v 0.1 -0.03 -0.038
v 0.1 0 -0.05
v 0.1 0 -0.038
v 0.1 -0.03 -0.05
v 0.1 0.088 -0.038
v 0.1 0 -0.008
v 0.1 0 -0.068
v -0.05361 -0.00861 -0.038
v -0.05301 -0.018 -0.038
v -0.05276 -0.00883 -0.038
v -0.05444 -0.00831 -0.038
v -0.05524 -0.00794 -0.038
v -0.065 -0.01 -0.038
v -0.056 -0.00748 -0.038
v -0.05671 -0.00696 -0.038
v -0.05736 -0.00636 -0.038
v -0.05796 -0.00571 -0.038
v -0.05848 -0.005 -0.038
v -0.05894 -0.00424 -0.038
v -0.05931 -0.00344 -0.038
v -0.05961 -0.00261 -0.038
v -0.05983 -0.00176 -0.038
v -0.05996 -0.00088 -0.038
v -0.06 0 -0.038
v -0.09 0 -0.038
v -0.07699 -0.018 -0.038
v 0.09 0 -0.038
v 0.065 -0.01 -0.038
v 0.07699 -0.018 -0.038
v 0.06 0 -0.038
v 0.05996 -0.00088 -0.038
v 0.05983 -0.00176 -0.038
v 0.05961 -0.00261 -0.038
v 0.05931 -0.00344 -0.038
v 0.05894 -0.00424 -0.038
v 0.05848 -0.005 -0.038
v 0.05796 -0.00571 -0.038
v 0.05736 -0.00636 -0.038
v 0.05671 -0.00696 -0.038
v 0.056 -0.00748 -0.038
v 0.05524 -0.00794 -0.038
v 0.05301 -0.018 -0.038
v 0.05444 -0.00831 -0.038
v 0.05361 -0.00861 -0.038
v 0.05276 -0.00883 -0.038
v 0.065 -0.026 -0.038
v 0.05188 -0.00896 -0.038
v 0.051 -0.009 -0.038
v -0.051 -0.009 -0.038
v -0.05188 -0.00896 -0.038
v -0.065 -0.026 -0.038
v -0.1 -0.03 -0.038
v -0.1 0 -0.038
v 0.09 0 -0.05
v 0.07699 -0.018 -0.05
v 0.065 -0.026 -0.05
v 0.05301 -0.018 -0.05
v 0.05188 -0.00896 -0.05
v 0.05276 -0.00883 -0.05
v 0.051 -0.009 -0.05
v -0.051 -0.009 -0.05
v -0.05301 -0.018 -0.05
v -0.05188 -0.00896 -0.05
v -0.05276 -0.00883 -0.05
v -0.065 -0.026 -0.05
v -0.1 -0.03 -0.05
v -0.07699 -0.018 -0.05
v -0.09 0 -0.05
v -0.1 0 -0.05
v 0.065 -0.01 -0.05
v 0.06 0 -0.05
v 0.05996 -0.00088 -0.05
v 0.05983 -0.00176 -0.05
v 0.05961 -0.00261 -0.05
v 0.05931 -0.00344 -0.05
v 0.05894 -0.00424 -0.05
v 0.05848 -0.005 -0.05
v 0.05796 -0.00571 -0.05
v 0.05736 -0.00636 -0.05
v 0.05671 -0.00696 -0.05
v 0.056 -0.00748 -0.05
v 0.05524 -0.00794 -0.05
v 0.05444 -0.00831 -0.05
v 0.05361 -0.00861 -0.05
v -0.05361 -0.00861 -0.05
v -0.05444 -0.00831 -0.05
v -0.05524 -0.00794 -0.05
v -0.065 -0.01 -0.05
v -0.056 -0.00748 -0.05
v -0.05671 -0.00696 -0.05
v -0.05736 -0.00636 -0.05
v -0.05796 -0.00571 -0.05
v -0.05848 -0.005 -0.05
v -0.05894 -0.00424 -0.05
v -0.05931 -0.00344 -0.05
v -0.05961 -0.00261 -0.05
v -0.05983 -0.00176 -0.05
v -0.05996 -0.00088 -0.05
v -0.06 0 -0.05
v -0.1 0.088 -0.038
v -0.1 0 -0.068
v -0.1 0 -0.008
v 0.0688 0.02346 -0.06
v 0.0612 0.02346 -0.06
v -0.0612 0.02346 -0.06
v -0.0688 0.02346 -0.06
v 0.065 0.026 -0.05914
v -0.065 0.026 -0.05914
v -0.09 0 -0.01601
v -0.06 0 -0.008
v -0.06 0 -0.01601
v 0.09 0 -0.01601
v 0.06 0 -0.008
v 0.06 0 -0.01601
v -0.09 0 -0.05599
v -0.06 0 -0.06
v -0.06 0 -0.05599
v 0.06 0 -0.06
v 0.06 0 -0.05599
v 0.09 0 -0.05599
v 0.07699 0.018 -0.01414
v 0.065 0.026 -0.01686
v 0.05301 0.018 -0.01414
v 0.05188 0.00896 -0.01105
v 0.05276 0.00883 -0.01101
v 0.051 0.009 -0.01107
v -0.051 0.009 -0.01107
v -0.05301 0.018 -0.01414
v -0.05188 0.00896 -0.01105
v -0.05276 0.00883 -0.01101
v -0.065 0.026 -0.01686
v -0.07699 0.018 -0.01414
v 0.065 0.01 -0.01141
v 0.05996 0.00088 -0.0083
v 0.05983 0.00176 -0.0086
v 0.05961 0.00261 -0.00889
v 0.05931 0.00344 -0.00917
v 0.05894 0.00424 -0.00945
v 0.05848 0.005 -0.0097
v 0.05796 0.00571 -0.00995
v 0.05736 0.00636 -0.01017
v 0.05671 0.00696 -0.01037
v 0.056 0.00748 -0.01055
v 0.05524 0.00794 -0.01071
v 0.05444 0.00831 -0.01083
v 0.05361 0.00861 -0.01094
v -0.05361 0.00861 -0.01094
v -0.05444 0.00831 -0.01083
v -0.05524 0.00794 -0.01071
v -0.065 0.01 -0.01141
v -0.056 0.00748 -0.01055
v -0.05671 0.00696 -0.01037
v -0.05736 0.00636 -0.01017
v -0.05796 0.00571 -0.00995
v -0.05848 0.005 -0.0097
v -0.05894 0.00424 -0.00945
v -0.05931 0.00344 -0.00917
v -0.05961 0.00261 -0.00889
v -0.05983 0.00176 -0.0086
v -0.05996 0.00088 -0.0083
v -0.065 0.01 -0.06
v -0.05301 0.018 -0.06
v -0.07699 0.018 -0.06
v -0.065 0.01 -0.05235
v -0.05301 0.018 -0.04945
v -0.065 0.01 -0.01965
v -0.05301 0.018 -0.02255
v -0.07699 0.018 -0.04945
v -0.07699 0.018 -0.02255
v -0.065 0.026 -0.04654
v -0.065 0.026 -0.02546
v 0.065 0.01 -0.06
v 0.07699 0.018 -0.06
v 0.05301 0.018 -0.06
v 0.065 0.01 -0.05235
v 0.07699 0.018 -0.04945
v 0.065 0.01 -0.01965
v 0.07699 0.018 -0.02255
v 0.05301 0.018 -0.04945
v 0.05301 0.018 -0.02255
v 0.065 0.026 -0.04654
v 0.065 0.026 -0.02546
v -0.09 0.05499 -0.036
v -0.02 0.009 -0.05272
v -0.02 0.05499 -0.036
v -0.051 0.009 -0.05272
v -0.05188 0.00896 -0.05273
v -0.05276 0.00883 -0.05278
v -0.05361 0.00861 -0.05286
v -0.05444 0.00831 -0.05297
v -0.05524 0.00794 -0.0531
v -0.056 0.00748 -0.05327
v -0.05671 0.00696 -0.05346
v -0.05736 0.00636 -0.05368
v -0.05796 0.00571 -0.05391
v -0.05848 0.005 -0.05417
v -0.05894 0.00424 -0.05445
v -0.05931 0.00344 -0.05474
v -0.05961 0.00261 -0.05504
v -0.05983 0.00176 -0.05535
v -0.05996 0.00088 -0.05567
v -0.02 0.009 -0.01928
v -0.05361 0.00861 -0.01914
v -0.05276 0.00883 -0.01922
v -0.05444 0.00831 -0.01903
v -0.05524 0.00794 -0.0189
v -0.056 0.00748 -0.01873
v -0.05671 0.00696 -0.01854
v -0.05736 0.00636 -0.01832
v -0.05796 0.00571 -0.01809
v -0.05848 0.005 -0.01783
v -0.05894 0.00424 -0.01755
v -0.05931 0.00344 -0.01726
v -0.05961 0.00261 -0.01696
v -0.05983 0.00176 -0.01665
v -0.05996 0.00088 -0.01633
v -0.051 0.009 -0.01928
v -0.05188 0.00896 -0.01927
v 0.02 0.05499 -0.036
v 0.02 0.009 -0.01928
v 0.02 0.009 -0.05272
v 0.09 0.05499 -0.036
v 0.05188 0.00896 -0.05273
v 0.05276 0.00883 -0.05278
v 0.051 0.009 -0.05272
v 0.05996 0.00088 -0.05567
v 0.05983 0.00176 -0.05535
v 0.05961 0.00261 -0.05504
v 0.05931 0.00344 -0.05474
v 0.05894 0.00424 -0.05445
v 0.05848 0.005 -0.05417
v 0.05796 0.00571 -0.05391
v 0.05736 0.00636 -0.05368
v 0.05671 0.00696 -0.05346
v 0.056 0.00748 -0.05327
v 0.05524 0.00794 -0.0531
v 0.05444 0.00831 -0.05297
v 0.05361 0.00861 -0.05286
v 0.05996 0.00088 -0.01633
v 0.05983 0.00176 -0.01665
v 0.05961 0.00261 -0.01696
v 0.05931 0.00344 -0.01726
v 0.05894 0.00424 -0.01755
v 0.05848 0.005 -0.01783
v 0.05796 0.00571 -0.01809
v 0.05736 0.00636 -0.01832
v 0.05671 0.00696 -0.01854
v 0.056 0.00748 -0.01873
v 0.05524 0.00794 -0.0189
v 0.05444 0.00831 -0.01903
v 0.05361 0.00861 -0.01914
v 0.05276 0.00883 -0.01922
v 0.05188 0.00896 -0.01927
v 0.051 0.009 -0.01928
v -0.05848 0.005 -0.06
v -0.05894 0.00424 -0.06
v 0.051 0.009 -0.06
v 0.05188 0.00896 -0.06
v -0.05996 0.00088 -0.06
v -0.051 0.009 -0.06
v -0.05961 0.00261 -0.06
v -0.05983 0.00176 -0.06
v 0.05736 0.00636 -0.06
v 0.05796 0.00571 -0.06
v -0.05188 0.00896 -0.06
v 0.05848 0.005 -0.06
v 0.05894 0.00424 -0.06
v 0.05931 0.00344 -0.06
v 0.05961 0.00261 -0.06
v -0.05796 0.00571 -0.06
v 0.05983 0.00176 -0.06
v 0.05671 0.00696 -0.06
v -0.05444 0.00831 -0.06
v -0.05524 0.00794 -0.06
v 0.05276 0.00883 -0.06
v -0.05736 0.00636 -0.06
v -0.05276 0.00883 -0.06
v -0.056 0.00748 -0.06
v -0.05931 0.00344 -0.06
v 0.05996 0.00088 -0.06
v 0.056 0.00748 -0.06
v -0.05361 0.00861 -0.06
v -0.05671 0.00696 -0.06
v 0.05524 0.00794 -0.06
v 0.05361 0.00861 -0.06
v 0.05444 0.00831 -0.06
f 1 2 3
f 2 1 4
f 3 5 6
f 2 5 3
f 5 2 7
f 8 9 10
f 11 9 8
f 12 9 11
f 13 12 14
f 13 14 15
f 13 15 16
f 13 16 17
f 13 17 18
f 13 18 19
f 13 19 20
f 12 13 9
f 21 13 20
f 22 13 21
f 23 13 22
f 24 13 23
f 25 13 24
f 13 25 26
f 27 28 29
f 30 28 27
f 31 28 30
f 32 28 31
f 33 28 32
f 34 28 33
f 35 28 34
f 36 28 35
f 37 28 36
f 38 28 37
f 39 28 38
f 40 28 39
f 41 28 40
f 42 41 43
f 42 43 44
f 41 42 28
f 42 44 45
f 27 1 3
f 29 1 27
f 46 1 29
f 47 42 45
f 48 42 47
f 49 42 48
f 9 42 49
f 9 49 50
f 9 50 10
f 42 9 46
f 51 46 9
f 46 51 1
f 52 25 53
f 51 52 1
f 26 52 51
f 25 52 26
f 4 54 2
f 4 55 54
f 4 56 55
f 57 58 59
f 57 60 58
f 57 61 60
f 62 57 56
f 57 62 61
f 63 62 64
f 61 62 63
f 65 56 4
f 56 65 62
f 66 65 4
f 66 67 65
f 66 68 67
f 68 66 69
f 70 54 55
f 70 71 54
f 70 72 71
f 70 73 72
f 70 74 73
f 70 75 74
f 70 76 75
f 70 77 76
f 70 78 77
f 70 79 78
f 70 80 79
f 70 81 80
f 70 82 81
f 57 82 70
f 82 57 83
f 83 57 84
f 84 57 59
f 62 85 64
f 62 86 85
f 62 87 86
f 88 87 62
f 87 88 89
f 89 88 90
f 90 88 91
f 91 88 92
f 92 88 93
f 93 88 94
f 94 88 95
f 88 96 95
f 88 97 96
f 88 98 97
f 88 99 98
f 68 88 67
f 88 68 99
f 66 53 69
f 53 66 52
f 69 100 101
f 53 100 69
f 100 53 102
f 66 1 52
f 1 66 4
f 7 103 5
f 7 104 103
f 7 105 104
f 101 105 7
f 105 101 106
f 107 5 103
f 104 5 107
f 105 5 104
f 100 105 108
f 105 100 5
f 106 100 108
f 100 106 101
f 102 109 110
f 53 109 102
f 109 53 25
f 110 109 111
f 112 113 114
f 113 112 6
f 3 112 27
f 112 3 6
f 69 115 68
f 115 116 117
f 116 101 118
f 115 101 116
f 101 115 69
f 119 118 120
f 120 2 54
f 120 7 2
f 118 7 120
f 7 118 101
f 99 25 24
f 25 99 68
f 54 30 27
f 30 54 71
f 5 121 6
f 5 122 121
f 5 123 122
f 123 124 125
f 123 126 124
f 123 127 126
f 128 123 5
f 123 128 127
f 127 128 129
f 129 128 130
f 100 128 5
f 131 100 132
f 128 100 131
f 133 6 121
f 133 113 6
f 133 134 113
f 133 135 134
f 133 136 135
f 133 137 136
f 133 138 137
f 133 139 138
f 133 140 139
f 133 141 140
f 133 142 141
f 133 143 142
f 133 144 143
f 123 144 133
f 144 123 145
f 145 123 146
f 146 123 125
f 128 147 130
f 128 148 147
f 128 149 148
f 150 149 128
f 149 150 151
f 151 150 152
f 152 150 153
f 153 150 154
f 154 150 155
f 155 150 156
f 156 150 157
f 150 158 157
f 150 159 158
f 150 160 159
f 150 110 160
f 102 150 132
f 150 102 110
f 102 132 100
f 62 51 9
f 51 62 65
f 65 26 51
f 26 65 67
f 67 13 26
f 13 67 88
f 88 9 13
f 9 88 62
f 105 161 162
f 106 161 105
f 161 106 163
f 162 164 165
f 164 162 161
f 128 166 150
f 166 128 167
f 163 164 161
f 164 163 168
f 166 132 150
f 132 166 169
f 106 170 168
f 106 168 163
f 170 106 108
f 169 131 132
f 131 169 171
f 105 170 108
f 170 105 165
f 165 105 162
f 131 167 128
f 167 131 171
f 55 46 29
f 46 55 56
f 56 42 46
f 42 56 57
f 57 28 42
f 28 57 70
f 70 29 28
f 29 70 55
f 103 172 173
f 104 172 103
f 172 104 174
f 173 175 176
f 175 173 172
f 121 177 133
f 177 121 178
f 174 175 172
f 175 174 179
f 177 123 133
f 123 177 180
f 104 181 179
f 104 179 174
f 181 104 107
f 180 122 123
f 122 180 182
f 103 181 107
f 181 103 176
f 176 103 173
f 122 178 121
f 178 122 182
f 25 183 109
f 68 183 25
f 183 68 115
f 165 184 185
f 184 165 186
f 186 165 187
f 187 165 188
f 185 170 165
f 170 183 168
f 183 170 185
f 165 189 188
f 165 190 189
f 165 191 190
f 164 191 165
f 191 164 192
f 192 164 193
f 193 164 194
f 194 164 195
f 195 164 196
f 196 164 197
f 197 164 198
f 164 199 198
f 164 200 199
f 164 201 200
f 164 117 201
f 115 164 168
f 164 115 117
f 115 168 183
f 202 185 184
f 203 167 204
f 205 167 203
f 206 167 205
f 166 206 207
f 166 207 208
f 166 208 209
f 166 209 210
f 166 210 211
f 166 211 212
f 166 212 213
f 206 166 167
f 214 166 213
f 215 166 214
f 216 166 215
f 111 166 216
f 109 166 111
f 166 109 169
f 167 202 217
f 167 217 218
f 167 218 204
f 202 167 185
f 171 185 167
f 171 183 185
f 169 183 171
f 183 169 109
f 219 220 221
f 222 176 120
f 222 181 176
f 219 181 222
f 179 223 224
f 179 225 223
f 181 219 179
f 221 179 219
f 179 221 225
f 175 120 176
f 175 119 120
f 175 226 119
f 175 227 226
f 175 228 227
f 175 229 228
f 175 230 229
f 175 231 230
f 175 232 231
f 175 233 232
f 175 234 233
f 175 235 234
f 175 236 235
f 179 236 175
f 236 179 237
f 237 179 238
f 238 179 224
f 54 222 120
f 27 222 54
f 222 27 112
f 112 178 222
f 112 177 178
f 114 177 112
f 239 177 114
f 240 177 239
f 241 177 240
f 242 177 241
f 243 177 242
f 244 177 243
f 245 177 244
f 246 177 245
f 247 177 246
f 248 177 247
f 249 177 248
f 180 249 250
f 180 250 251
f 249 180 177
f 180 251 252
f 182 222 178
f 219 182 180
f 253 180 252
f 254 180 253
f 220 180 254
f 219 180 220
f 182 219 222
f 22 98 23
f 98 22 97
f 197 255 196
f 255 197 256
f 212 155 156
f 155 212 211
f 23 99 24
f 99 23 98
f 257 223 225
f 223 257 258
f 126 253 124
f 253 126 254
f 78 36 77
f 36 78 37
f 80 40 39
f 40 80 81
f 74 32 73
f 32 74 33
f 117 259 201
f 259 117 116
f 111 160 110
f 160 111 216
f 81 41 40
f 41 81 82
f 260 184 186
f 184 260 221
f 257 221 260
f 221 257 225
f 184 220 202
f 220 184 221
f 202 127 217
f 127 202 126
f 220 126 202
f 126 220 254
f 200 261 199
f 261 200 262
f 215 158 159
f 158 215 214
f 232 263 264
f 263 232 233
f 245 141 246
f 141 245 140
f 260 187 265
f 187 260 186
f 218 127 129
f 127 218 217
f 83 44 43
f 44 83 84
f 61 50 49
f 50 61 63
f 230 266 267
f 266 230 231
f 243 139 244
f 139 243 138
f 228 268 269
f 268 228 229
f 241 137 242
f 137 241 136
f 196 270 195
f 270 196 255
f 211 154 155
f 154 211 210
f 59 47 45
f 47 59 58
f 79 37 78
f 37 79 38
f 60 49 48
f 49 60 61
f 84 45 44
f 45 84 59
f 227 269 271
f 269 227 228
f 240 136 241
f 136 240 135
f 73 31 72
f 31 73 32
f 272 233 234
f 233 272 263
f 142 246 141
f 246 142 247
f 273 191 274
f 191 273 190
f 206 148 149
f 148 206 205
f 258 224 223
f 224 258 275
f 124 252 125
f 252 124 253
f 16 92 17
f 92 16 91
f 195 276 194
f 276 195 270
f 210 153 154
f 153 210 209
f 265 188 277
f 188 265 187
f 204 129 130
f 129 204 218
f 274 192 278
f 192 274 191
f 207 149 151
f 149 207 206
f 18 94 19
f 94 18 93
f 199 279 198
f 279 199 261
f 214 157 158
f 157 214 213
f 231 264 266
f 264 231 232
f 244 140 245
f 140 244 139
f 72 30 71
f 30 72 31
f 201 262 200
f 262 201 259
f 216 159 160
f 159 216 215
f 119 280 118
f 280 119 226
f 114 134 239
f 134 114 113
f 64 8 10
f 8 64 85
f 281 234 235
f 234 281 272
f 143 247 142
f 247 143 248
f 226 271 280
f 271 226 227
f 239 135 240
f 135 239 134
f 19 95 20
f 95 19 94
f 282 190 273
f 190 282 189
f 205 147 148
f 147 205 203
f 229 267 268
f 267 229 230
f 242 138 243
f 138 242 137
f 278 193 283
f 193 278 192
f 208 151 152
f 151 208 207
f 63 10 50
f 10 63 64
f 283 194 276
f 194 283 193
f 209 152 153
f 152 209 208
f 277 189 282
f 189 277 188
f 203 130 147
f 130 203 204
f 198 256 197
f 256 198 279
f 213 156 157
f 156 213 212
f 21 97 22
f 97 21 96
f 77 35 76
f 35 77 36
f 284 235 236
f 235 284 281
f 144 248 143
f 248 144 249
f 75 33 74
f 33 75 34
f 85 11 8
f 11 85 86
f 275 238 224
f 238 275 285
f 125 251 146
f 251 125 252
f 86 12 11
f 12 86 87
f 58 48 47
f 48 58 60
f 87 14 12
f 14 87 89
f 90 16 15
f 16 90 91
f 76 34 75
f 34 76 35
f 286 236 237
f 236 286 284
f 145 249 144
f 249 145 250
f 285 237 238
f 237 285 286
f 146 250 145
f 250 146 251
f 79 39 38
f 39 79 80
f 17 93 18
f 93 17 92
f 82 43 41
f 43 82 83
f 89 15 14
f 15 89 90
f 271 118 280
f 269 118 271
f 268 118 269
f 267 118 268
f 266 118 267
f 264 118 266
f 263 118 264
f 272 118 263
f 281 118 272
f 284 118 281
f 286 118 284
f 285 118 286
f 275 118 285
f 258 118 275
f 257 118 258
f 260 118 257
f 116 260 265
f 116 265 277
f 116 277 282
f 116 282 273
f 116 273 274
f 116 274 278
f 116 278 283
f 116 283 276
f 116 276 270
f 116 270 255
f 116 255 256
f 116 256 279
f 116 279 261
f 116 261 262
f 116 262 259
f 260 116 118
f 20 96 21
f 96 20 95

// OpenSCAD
$fn=64;

L = 0.2;
W = 0.06;
H = 0.1;

t_base = 0.012;
t_web  = 0.010;

slot_len = 0.12;
slot_w   = 0.018;
slot_r   = slot_w/2;

diamond_w = 0.016;
diamond_l = 0.024;

end_offset = 0.065;
hole_y = 0.018;

tri_cut_len = 0.07;
tri_cut_h   = 0.055;
tri_cut_w   = 0.040;

center_diamond_w = 0.014;
center_diamond_l = 0.020;

module rounded_slot(len, w, r, h){
    linear_extrude(height=h, center=true)
        hull(){
            translate([-(len/2 - r), 0]) circle(r=r);
            translate([ (len/2 - r), 0]) circle(r=r);
        }
}

module diamond2d(l, w){
    polygon(points=[
        [ l/2, 0],
        [ 0,  w/2],
        [-l/2, 0],
        [ 0, -w/2]
    ]);
}

module diamond_hole(l, w, h){
    linear_extrude(height=h, center=true) diamond2d(l, w);
}

module tri_prism_x(len, w, h){
    linear_extrude(height=len, center=true)
        polygon(points=[
            [-w/2, 0],
            [ w/2, 0],
            [ 0,   h]
        ]);
}

module rail_solid(){
    union(){
        translate([0,0,-H/2 + t_base/2])
            cube([L, W, t_base], center=true);

        translate([0,0,-H/2 + t_base])
            rotate([0,90,0])
                linear_extrude(height=L, center=true)
                    polygon(points=[
                        [-W/2, 0],
                        [ W/2, 0],
                        [ 0,   H - t_base]
                    ]);
    }
}

module rail_cuts(){
    union(){
        translate([0,0,0])
            rounded_slot(slot_len, slot_w, slot_r, H+0.02);

        for (sx=[-1,1], sy=[-1,1]){
            translate([sx*end_offset, sy*hole_y, 0])
                diamond_hole(diamond_l, diamond_w, H+0.02);
        }

        for (sx=[-1,1]){
            translate([sx*(L/2 - tri_cut_len/2 - 0.01), 0, -H/2 + t_base + 0.002])
                rotate([0,90,0])
                    tri_prism_x(tri_cut_len, tri_cut_w, tri_cut_h);
        }

        translate([0,0,0])
            diamond_hole(center_diamond_l, center_diamond_w, H+0.02);
    }
}

difference(){
    rail_solid();
    rail_cuts();
}
